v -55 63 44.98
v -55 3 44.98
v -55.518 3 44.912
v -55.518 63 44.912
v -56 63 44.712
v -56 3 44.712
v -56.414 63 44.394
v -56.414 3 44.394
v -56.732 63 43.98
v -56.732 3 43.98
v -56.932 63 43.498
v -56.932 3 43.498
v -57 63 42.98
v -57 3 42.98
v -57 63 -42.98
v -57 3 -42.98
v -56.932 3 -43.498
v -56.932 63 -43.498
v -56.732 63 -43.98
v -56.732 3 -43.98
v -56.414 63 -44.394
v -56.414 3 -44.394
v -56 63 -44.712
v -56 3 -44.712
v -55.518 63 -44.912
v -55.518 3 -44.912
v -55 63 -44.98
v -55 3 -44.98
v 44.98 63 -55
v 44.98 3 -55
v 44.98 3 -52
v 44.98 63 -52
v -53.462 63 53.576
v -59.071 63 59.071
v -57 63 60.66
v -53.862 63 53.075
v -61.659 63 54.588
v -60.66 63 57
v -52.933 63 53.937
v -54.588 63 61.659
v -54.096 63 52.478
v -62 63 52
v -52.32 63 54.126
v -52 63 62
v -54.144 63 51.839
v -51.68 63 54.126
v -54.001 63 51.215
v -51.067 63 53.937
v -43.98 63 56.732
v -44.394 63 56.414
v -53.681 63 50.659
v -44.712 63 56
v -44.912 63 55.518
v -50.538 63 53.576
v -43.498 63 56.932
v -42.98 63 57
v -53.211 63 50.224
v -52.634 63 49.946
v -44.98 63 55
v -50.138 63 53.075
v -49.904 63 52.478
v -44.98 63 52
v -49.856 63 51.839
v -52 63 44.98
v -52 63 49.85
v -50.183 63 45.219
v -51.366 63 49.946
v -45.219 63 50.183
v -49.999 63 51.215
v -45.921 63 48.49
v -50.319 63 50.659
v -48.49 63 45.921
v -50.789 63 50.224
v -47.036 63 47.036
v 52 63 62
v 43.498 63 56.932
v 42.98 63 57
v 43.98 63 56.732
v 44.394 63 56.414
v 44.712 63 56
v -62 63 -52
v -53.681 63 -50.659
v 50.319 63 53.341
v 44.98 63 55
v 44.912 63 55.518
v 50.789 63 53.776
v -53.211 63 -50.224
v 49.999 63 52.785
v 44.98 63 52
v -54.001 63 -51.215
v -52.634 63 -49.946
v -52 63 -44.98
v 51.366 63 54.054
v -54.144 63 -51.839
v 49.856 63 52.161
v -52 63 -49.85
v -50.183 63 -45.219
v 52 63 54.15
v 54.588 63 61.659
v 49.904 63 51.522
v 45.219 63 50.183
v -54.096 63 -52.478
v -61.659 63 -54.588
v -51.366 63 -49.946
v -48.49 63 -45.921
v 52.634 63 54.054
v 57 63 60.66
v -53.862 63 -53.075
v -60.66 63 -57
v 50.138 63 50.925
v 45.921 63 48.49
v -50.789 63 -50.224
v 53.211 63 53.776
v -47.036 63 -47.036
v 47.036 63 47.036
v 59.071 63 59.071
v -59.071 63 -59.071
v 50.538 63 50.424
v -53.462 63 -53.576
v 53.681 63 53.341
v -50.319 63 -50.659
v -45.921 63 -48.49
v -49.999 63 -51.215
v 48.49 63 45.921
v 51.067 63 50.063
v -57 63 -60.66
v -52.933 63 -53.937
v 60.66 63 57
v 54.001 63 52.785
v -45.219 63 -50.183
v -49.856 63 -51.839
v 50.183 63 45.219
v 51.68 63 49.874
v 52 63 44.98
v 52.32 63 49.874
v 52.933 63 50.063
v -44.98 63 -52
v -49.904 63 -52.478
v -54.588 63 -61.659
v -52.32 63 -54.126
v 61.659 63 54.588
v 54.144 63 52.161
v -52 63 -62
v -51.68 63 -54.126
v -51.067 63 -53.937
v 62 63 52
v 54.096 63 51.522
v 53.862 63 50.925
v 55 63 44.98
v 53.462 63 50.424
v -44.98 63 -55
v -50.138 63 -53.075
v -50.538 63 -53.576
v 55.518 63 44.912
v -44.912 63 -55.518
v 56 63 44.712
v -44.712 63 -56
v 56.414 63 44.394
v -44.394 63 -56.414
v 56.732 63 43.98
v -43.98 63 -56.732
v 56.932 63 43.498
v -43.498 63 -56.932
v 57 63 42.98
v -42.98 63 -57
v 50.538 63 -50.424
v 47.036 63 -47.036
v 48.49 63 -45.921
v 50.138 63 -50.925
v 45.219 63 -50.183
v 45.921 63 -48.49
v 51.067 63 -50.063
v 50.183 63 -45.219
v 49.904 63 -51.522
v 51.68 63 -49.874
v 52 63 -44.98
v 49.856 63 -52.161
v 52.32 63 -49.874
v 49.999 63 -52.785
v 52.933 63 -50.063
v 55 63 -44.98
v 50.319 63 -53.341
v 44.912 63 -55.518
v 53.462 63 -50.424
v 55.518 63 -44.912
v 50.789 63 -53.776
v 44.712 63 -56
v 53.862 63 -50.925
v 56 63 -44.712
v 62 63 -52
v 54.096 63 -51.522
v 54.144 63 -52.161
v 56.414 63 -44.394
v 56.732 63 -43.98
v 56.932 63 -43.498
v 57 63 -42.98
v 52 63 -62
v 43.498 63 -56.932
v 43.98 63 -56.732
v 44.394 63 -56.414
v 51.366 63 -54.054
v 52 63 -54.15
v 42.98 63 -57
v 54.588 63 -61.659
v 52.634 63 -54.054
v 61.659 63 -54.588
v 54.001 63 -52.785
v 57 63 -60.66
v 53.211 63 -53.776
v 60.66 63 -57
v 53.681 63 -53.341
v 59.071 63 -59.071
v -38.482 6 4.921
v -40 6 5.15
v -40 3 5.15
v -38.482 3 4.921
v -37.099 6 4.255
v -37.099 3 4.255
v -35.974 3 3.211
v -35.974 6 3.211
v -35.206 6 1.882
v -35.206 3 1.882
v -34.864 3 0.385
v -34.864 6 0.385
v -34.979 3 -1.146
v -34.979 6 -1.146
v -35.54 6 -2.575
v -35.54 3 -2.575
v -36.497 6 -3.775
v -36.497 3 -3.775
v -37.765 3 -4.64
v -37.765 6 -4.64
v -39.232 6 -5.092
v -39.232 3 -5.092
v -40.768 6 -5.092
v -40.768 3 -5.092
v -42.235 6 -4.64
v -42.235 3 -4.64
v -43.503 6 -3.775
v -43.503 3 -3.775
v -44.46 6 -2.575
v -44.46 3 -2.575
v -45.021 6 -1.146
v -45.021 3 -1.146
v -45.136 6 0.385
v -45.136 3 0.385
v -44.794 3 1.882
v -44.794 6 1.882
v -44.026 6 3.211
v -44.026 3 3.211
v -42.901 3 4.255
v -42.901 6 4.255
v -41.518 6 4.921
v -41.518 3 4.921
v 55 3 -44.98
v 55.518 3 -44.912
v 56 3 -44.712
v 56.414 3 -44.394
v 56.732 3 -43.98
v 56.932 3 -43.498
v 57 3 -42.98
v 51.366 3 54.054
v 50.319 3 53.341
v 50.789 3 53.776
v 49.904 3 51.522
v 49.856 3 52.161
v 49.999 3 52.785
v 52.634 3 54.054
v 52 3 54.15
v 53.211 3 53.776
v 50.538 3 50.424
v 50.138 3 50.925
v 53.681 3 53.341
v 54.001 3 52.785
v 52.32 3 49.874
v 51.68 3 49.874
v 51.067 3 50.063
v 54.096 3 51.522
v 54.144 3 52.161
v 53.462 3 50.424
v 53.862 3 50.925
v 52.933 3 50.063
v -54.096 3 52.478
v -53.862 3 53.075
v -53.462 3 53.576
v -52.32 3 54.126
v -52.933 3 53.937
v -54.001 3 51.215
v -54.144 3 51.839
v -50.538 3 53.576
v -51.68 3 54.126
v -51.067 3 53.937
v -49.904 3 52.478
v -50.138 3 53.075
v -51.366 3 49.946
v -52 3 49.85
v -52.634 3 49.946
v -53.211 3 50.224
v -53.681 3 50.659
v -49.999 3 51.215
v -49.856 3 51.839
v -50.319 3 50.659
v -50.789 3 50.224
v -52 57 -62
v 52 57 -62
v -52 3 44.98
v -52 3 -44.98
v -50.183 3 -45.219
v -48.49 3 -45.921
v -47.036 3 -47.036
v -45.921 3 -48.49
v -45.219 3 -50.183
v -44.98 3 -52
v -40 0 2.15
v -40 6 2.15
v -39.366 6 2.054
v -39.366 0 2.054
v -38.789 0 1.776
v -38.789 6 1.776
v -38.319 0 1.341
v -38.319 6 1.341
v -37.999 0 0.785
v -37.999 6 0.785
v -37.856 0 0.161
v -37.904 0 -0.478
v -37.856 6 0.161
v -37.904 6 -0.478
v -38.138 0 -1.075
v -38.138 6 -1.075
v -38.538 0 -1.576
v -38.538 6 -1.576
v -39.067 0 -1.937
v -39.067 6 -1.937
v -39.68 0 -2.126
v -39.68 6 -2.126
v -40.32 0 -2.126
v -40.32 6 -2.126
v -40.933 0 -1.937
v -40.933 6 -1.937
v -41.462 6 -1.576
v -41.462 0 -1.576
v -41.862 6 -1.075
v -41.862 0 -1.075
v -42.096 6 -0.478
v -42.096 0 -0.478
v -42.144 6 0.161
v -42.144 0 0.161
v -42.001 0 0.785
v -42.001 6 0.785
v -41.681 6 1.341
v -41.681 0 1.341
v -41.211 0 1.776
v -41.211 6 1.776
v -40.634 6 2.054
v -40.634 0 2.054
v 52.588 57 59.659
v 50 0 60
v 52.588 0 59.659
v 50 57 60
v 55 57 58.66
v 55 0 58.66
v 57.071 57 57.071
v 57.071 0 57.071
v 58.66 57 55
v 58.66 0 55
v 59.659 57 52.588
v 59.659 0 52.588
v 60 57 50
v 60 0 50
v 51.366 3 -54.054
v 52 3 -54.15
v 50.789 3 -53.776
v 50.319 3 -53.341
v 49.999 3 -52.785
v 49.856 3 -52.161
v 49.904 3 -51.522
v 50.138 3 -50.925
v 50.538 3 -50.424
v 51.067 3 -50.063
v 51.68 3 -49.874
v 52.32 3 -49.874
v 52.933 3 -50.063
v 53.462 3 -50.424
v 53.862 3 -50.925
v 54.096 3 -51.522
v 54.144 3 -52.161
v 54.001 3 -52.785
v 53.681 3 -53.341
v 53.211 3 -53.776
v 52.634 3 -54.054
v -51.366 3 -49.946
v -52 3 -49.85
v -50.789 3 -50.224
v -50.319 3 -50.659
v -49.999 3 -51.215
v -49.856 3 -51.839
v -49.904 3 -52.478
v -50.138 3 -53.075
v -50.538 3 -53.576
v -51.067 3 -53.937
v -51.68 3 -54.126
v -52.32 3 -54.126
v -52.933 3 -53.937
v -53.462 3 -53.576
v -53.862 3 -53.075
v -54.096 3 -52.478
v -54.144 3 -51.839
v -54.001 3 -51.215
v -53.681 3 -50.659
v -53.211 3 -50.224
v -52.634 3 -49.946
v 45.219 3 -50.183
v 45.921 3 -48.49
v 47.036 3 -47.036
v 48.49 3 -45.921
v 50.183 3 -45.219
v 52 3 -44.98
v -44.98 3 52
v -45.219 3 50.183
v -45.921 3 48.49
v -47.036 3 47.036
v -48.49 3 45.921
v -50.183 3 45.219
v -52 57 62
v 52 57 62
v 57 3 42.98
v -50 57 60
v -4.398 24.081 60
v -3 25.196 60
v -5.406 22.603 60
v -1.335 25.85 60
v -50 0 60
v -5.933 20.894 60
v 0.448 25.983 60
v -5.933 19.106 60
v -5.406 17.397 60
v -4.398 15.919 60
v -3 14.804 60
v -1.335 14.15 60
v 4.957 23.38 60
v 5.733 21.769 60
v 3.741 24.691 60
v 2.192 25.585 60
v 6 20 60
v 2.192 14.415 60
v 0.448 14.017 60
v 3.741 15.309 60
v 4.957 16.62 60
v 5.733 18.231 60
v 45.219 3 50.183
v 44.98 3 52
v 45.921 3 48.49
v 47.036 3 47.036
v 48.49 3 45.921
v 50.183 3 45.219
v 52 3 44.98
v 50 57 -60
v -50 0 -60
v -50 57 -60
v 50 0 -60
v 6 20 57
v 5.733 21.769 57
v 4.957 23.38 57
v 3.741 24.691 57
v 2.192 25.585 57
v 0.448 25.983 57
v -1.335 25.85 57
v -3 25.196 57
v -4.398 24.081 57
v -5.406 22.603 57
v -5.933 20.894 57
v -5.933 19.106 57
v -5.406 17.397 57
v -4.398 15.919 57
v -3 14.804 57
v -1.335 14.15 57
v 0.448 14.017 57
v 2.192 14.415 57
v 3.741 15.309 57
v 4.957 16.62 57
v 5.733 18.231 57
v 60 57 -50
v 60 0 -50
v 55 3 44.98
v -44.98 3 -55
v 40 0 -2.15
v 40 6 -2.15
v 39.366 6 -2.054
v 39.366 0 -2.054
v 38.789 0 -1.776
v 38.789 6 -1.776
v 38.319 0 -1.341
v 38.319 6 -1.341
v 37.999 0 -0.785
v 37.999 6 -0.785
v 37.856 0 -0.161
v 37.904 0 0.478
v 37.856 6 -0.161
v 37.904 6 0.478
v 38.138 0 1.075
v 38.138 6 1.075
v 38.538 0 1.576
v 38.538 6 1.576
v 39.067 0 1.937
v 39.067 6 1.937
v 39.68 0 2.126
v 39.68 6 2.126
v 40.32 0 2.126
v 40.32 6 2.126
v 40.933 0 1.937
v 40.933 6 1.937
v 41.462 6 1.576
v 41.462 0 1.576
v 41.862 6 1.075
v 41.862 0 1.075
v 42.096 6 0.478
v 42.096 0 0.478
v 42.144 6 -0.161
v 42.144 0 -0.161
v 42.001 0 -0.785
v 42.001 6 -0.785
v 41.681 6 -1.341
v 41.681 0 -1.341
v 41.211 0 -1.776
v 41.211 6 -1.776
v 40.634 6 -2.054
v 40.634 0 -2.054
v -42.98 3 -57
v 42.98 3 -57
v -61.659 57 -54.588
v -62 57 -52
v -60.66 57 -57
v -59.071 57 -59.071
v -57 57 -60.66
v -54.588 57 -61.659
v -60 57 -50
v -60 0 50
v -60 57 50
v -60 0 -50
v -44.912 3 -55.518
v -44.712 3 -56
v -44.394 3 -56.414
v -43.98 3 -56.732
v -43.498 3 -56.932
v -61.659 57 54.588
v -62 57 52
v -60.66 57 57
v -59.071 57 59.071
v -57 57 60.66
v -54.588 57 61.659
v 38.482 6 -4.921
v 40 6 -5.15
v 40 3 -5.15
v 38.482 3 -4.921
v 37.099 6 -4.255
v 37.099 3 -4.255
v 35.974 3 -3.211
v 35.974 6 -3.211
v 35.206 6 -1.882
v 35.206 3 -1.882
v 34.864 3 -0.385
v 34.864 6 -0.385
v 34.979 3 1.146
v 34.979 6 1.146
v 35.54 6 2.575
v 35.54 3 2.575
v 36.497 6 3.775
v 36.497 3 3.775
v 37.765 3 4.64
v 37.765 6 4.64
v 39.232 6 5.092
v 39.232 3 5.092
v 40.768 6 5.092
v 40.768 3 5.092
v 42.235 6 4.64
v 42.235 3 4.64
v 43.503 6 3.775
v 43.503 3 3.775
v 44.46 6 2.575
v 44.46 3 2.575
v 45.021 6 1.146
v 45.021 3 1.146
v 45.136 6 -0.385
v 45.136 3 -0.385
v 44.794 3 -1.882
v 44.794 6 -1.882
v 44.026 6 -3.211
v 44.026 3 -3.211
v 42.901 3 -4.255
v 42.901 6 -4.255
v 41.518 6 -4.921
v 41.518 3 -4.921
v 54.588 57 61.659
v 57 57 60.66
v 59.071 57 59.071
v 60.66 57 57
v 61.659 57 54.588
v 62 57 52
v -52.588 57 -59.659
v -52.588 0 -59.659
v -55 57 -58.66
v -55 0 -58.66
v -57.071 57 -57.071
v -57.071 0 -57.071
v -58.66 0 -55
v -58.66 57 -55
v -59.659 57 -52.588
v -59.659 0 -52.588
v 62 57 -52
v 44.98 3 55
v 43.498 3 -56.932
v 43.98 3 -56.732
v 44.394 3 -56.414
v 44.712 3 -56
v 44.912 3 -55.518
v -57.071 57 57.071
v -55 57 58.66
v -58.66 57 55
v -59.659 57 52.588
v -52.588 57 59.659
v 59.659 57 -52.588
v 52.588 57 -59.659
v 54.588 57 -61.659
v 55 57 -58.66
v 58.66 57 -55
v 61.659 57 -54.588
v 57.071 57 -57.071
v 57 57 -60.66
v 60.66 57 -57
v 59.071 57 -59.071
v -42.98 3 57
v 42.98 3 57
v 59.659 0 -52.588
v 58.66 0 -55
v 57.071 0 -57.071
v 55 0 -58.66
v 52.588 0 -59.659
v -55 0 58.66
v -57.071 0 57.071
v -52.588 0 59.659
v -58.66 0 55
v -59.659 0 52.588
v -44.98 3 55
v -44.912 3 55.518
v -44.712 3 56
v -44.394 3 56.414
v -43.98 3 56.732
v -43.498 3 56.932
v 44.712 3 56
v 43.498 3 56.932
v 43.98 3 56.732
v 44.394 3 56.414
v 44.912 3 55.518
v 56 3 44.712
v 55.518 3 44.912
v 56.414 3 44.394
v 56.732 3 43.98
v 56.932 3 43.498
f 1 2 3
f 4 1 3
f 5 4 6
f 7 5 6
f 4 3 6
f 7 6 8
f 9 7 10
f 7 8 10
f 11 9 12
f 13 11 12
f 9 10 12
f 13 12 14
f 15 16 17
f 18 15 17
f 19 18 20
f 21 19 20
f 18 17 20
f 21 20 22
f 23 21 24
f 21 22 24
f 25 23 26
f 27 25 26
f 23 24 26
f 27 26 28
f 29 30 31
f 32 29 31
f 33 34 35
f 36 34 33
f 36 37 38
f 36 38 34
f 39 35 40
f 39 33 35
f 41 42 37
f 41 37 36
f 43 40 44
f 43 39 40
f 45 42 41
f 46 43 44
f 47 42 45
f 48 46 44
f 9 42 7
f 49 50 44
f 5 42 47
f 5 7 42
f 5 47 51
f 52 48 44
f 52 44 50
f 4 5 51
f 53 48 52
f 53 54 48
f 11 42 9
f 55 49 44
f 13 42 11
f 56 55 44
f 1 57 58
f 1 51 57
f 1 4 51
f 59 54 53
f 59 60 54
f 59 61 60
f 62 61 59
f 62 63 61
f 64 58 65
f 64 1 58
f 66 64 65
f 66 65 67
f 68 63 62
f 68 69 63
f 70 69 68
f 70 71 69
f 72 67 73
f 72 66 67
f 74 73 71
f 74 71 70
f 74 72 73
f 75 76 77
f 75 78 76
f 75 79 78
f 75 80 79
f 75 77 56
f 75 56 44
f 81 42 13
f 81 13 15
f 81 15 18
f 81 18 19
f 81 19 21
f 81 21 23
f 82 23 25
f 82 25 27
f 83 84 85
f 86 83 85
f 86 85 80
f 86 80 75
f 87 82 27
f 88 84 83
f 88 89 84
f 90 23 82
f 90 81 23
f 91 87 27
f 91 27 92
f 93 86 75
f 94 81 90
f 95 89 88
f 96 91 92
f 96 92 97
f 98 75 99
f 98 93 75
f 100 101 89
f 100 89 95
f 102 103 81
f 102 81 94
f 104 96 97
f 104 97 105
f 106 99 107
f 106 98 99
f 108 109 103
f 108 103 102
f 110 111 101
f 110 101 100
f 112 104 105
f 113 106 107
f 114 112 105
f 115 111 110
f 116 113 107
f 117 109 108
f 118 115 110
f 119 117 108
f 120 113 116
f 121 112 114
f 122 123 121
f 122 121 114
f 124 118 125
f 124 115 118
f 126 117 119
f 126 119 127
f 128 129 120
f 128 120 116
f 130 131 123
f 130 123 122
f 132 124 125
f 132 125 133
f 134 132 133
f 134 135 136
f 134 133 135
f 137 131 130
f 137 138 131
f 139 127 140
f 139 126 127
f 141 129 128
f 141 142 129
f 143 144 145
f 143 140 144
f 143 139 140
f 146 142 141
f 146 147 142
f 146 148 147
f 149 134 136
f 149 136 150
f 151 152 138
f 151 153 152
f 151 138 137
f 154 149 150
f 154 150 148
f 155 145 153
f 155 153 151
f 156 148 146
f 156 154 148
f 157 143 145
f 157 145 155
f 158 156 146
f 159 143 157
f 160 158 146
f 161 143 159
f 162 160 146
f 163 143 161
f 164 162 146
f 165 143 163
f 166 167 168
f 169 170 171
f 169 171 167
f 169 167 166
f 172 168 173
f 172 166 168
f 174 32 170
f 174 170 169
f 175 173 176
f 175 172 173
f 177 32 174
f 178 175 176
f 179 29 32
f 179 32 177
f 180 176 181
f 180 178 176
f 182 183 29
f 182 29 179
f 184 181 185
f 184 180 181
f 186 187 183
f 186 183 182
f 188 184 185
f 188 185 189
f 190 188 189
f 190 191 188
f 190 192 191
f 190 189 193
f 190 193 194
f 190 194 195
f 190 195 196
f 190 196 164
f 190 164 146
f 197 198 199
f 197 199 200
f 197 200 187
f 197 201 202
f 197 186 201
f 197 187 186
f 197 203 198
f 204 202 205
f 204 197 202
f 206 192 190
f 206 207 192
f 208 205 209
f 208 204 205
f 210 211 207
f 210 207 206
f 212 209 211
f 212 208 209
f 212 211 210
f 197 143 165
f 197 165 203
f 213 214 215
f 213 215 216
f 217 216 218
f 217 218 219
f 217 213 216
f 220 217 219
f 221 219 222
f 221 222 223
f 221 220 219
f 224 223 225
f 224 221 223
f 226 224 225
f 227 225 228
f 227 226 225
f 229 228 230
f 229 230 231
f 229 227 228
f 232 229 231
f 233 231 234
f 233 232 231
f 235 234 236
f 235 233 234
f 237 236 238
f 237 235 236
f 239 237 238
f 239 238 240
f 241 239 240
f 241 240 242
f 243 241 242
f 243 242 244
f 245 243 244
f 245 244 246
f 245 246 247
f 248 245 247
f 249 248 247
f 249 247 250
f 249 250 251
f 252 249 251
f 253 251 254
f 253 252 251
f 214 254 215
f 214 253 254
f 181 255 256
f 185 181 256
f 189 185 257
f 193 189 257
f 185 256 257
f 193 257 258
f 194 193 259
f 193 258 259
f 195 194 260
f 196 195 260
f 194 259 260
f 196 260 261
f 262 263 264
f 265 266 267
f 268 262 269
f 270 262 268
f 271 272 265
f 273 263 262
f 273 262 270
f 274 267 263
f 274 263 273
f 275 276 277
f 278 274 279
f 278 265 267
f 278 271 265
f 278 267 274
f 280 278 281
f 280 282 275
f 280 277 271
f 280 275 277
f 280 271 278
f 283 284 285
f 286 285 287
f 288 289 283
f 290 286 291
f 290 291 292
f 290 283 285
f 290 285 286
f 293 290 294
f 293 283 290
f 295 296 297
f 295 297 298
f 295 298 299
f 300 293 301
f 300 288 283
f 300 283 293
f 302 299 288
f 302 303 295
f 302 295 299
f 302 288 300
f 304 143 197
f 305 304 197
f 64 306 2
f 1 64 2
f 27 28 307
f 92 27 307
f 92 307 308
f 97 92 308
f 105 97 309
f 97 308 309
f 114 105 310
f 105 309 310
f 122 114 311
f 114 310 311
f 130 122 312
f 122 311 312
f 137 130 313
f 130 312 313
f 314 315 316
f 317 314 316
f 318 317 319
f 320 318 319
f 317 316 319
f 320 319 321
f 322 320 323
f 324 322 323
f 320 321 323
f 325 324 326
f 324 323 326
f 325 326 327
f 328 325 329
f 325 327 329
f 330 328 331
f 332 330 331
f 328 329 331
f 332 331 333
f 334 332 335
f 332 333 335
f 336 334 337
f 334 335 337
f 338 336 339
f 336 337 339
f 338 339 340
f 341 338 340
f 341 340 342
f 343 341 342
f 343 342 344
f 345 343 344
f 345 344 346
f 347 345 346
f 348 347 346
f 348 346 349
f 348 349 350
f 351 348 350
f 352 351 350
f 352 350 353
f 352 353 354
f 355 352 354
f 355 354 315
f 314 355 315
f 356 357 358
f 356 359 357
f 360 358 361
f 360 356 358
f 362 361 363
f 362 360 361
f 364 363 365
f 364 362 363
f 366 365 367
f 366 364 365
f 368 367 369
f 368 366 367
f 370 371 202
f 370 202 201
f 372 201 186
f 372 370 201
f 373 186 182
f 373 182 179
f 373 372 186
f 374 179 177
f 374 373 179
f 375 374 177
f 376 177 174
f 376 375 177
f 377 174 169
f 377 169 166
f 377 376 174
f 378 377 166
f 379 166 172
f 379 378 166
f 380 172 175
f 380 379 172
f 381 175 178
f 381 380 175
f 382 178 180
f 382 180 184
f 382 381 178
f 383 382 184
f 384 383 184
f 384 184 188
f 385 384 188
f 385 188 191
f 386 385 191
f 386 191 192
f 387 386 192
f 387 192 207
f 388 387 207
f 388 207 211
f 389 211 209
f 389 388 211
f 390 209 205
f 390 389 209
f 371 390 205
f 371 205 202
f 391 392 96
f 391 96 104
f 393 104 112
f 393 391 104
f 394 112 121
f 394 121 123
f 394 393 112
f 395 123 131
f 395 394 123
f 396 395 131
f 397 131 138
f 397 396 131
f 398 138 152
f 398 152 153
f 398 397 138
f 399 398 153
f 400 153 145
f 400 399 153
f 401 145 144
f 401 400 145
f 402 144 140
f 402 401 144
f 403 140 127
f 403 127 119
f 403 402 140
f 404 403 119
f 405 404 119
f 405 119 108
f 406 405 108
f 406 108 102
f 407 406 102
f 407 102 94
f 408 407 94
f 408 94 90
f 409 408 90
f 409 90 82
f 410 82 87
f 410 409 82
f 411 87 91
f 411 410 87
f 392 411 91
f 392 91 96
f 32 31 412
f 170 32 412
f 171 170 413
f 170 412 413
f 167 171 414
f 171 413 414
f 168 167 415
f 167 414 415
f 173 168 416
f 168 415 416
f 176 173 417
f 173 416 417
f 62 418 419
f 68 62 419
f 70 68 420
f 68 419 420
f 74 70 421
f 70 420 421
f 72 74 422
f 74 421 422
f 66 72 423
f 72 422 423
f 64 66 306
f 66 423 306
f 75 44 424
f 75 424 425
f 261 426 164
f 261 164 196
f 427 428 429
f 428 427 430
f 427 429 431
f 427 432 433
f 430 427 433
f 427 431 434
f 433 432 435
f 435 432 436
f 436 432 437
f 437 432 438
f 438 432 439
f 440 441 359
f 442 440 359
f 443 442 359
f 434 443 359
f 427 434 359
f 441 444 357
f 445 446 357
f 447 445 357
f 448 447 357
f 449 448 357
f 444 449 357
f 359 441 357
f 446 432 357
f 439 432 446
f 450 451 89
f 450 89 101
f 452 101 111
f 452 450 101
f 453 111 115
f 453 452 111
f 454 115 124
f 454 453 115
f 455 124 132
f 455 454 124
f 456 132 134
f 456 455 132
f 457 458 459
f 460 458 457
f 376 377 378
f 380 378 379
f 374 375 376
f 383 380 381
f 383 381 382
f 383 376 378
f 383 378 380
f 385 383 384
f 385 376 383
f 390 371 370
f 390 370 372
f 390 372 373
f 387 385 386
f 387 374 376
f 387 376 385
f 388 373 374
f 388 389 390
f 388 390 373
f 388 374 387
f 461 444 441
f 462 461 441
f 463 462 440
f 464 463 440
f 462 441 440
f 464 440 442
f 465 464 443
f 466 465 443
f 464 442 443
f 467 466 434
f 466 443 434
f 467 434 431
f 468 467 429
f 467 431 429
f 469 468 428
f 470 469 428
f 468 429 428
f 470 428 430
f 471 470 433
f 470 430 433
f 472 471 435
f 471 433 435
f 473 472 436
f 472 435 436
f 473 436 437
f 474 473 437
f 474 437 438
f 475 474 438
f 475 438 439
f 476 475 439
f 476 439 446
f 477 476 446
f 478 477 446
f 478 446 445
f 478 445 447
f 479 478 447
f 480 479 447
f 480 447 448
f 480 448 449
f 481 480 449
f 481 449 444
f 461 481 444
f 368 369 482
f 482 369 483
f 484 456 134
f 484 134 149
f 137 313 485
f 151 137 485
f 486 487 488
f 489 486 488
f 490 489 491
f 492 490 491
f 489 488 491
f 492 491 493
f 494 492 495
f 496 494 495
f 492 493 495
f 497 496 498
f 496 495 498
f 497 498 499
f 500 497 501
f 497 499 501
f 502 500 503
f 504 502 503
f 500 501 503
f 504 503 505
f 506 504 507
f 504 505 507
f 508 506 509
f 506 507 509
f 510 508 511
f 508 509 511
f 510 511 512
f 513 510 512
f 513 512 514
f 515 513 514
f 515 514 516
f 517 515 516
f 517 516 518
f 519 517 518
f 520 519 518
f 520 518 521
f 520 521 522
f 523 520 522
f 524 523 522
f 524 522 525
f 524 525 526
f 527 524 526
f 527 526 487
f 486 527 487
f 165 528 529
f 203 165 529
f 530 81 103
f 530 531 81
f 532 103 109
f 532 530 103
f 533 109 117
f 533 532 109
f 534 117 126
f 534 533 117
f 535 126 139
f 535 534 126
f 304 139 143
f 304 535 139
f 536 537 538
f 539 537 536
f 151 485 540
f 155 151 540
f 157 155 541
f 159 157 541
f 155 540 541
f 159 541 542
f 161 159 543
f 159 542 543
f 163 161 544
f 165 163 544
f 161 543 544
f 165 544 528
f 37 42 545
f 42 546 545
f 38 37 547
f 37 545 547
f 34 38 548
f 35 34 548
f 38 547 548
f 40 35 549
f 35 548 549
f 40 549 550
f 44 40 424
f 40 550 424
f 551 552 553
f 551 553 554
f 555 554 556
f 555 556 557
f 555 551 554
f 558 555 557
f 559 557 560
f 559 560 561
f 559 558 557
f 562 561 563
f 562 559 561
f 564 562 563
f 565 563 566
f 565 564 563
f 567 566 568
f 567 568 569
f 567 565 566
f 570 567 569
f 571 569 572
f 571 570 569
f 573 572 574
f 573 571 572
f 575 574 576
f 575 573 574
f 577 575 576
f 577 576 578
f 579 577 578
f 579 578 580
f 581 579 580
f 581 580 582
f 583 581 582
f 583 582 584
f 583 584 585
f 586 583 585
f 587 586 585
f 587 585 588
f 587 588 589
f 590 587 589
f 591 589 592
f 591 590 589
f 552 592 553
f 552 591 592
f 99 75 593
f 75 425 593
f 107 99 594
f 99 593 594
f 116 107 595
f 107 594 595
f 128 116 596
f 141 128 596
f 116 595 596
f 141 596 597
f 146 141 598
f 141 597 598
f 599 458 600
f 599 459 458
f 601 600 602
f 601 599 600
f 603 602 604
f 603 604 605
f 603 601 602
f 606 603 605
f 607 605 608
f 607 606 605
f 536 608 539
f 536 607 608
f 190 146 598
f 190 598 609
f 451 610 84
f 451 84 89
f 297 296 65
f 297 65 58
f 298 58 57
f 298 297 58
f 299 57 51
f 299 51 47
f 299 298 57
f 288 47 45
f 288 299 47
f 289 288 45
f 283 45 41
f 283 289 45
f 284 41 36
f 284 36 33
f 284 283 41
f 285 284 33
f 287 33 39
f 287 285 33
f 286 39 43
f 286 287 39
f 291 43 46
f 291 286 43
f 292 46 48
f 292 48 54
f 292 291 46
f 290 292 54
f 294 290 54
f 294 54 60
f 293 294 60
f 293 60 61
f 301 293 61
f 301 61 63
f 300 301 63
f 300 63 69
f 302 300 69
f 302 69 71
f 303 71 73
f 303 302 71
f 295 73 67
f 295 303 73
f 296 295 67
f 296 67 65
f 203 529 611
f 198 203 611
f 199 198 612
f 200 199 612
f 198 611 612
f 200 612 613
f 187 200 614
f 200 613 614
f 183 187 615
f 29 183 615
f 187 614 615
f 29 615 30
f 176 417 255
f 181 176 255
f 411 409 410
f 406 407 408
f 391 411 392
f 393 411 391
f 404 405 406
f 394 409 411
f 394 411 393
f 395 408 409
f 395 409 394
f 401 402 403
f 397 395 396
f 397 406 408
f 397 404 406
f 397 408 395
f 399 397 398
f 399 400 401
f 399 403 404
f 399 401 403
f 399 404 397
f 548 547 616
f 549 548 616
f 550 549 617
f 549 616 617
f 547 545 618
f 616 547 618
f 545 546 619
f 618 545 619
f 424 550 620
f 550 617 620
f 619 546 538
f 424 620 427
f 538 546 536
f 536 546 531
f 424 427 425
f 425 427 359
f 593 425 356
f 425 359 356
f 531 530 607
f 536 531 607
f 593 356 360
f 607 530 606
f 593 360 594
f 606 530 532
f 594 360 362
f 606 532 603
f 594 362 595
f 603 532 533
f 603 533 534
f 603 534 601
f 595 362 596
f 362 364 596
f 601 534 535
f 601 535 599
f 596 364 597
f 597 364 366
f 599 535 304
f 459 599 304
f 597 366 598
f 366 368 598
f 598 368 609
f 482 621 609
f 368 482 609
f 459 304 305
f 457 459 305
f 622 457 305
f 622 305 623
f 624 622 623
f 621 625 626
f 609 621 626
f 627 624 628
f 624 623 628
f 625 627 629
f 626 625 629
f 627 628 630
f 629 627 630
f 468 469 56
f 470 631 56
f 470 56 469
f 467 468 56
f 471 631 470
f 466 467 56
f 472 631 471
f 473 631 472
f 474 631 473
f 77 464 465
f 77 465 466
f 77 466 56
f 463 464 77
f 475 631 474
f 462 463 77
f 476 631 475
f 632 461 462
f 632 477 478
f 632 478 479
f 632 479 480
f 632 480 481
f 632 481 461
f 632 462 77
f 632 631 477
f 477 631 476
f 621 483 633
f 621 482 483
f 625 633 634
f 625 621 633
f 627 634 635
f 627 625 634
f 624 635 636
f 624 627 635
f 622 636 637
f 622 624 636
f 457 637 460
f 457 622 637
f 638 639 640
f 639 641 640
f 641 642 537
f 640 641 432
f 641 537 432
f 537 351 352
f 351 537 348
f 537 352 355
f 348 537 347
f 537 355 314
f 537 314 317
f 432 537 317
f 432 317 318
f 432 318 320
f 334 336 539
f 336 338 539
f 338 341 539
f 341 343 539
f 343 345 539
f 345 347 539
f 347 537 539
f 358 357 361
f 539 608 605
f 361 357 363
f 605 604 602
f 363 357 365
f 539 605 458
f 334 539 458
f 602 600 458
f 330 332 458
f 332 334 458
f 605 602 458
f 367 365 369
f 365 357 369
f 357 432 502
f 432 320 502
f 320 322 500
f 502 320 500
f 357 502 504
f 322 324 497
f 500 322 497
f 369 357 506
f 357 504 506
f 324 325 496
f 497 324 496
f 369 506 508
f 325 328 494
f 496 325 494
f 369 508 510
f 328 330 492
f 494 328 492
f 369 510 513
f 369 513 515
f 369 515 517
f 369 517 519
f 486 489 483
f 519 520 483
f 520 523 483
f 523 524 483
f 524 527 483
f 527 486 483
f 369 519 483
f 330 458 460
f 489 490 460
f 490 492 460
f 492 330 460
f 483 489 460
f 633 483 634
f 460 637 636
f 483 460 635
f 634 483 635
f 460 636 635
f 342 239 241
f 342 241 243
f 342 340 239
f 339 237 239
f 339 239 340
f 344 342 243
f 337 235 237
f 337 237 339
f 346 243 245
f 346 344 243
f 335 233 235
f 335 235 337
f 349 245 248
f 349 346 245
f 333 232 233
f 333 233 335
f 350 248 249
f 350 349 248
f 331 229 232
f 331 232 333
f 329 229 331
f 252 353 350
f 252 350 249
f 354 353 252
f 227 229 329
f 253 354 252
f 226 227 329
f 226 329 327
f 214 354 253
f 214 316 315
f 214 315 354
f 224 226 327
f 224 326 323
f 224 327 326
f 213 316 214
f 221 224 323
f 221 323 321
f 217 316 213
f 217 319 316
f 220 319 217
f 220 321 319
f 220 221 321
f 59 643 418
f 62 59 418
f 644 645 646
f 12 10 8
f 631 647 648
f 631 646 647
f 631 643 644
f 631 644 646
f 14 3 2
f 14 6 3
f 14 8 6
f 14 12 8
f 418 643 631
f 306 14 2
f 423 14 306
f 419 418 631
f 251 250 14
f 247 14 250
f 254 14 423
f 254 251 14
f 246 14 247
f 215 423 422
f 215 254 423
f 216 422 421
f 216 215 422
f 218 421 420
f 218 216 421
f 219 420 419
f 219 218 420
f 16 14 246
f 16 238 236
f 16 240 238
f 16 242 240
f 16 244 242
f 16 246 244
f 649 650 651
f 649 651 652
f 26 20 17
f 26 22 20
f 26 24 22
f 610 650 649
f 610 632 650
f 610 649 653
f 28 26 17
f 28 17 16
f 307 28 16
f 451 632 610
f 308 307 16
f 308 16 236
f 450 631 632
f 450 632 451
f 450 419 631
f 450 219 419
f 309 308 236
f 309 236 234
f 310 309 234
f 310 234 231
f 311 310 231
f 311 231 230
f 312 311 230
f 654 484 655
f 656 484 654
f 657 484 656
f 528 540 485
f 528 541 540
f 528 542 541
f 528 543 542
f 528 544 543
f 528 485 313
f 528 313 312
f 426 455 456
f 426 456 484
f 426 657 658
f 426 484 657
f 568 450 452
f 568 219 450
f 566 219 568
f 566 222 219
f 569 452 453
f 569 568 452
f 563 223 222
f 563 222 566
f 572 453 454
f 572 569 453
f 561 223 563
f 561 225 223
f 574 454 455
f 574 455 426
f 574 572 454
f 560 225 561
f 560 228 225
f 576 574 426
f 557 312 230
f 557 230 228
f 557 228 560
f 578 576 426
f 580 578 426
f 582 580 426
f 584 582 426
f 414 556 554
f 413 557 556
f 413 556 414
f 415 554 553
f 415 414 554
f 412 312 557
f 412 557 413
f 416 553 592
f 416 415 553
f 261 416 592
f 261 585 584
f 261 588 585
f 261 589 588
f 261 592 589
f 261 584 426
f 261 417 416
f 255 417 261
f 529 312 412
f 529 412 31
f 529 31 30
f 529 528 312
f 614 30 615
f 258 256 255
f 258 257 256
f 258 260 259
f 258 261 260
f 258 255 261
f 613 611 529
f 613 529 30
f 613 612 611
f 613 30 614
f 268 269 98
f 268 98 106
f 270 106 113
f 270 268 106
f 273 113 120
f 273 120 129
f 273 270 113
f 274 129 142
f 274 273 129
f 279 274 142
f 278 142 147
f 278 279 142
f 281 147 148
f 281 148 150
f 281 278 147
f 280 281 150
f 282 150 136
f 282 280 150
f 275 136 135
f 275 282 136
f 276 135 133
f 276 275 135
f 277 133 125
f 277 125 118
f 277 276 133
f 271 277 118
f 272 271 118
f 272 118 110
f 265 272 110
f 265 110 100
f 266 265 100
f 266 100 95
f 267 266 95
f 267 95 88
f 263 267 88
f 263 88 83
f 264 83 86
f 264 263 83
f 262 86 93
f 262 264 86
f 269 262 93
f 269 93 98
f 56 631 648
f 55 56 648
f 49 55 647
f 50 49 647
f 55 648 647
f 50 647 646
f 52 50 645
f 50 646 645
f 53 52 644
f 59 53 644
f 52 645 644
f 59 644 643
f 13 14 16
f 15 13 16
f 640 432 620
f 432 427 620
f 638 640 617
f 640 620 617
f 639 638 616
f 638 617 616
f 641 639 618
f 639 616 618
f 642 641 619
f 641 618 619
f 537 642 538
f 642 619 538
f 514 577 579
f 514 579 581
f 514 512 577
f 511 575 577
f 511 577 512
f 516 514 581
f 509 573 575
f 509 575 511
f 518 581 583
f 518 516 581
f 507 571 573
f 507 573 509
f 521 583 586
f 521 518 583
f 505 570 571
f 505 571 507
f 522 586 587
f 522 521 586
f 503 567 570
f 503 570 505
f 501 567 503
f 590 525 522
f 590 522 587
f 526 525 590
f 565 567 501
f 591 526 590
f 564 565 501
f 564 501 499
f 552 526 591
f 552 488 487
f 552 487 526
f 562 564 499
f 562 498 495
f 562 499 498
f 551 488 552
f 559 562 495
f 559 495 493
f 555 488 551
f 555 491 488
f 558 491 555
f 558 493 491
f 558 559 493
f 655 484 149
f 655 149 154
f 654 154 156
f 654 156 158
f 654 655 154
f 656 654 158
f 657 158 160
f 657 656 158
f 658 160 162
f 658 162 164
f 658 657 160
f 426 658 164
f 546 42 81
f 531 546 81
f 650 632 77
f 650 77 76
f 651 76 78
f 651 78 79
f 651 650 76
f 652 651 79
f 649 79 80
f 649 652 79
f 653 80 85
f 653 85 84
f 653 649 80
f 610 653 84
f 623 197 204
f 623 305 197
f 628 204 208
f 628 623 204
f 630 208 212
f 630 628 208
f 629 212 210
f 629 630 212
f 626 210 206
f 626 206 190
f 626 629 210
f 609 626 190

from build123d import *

# Parameters (mm, degrees)
SKETCH1_W           = 120
SKETCH1_H           = 120
BOSS_EXTRUDE1_DEPTH = 63
SHELL1_T            = -3
SKETCH2_R           = 2.15
BOSS_EXTRUDE2_DEPTH = 60
SKETCH3_W           = 124
SKETCH3_H           = 124
SKETCH3_W_2         = 120
SKETCH3_H_2         = 120
BOSS_EXTRUDE3_DEPTH = 6
FILLET1_R           = 10
SKETCH4_R           = 2.15
CUT_EXTRUDE1_DEPTH  = 3
BOSS_EXTRUDE4_START = 3
SKETCH5_R           = 5.15
SKETCH5_R_2         = 2.15
BOSS_EXTRUDE4_DEPTH = 3
SKETCH6_R           = 6
CUT_EXTRUDE2_DEPTH  = 10


with BuildPart() as part:
    # Sketch1 → Boss-Extrude1 (new body)
    with BuildSketch(Plane(origin=(0, 0, 0), x_dir=(1, 0, 0), z_dir=(0, 1, 0))):
        Rectangle(SKETCH1_W, SKETCH1_H)
    extrude(amount=BOSS_EXTRUDE1_DEPTH)

    # Shell1
    shell1_openings = [part.faces().sort_by_distance(p)[0] for p in [
        (0, 63, 0),
    ]]
    offset(amount=SHELL1_T, openings=shell1_openings, kind=Kind.INTERSECTION)

    # Sketch2 → Boss-Extrude2 (add)
    # profile 1 of 4: a face of its own
    with BuildSketch(Plane(origin=(0, 3, 0), x_dir=(1, 0, 0), z_dir=(0, 1, 0))):
        with BuildLine():
            Line((52, 44.98), (55, 44.98))
            ThreePointArc((55, 44.98), (56.414213562, 44.394213562), (57, 42.98))
            Line((57, 42.98), (57, 57))
            Line((57, 57), (42.98, 57))
            ThreePointArc((42.98, 57), (44.394213562, 56.414213562), (44.98, 55))
            Line((44.98, 55), (44.98, 52))
            ThreePointArc((44.98, 52), (47.036110396, 47.036110396), (52, 44.98))
        make_face()
        with Locations((52, 52)):
            Circle(SKETCH2_R, mode=Mode.SUBTRACT)
    # profile 2 of 4: a face of its own
    with BuildSketch(Plane(origin=(0, 3, 0), x_dir=(1, 0, 0), z_dir=(0, 1, 0))):
        with BuildLine():
            Line((-44.98, 52), (-44.98, 55))
            ThreePointArc((-44.98, 55), (-44.394213562, 56.414213562), (-42.98, 57))
            Line((-42.98, 57), (-57, 57))
            Line((-57, 57), (-57, 42.98))
            ThreePointArc((-57, 42.98), (-56.414213562, 44.394213562), (-55, 44.98))
            Line((-55, 44.98), (-52, 44.98))
            ThreePointArc((-52, 44.98), (-47.036110396, 47.036110396), (-44.98, 52))
        make_face()
        with Locations((-52, 52)):
            Circle(SKETCH2_R, mode=Mode.SUBTRACT)
    # profile 3 of 4: a face of its own
    with BuildSketch(Plane(origin=(0, 3, 0), x_dir=(1, 0, 0), z_dir=(0, 1, 0))):
        with BuildLine():
            Line((57, -42.98), (57, -57))
            Line((57, -57), (42.98, -57))
            ThreePointArc((42.98, -57), (44.394213562, -56.414213562), (44.98, -55))
            Line((44.98, -55), (44.98, -52))
            ThreePointArc((44.98, -52), (47.036110396, -47.036110396), (52, -44.98))
            Line((52, -44.98), (55, -44.98))
            ThreePointArc((55, -44.98), (56.414213562, -44.394213562), (57, -42.98))
        make_face()
        with Locations((52, -52)):
            Circle(SKETCH2_R, mode=Mode.SUBTRACT)
    # profile 4 of 4: a face of its own
    with BuildSketch(Plane(origin=(0, 3, 0), x_dir=(1, 0, 0), z_dir=(0, 1, 0))):
        with BuildLine():
            Line((-52, -44.98), (-55, -44.98))
            ThreePointArc((-55, -44.98), (-56.414213562, -44.394213562), (-57, -42.98))
            Line((-57, -42.98), (-57, -57))
            Line((-57, -57), (-42.98, -57))
            ThreePointArc((-42.98, -57), (-44.394213562, -56.414213562), (-44.98, -55))
            Line((-44.98, -55), (-44.98, -52))
            ThreePointArc((-44.98, -52), (-47.036110396, -47.036110396), (-52, -44.98))
        make_face()
        with Locations((-52, -52)):
            Circle(SKETCH2_R, mode=Mode.SUBTRACT)
    extrude(amount=BOSS_EXTRUDE2_DEPTH)

    # Sketch3 → Boss-Extrude3 (add)
    with BuildSketch(Plane(origin=(0, 63, 0), x_dir=(1, 0, 0), z_dir=(0, 1, 0))):
        Rectangle(SKETCH3_W, SKETCH3_H)
        Rectangle(SKETCH3_W_2, SKETCH3_H_2, mode=Mode.SUBTRACT)
    extrude(amount=-BOSS_EXTRUDE3_DEPTH)

    # Fillet1
    fillet1_edges = [part.edges().sort_by_distance(p)[0] for p in [
        (62, 60, 62),
        (60, 28.5, 60),
        (62, 60, -62),
        (60, 28.5, -60),
        (-62, 60, -62),
        (-60, 28.5, -60),
        (-62, 60, 62),
        (-60, 28.5, 60),
    ]]
    fillet(fillet1_edges, radius=FILLET1_R)

    # Sketch4 → Cut-Extrude1 (cut)
    with BuildSketch(Plane(origin=(0, 3, 0), x_dir=(1, 0, 0), z_dir=(0, 1, 0))):
        with Locations((-40, 0)):
            Circle(SKETCH4_R)
        with Locations((40, 0)):
            Circle(SKETCH4_R)
    extrude(amount=-CUT_EXTRUDE1_DEPTH, mode=Mode.SUBTRACT)

    # Sketch5 → Boss-Extrude4 (add)
    # profile 1 of 2: a face of its own
    with BuildSketch(Plane(origin=(0, 3, 0), x_dir=(1, 0, 0), z_dir=(0, 1, 0)).offset(BOSS_EXTRUDE4_START)):
        with Locations((-40, 0)):
            Circle(SKETCH5_R)
        with Locations((-40, 0)):
            Circle(SKETCH5_R_2, mode=Mode.SUBTRACT)
    # profile 2 of 2: a face of its own
    with BuildSketch(Plane(origin=(0, 3, 0), x_dir=(1, 0, 0), z_dir=(0, 1, 0)).offset(BOSS_EXTRUDE4_START)):
        with Locations((40, 0)):
            Circle(SKETCH5_R)
        with Locations((40, 0)):
            Circle(SKETCH5_R_2, mode=Mode.SUBTRACT)
    extrude(amount=-BOSS_EXTRUDE4_DEPTH)

    # Sketch6 → Cut-Extrude2 (cut)
    with BuildSketch(Plane.XY.offset(60)):
        with Locations((0, 20)):
            Circle(SKETCH6_R)
    extrude(amount=-CUT_EXTRUDE2_DEPTH, mode=Mode.SUBTRACT)


solid = part.part
